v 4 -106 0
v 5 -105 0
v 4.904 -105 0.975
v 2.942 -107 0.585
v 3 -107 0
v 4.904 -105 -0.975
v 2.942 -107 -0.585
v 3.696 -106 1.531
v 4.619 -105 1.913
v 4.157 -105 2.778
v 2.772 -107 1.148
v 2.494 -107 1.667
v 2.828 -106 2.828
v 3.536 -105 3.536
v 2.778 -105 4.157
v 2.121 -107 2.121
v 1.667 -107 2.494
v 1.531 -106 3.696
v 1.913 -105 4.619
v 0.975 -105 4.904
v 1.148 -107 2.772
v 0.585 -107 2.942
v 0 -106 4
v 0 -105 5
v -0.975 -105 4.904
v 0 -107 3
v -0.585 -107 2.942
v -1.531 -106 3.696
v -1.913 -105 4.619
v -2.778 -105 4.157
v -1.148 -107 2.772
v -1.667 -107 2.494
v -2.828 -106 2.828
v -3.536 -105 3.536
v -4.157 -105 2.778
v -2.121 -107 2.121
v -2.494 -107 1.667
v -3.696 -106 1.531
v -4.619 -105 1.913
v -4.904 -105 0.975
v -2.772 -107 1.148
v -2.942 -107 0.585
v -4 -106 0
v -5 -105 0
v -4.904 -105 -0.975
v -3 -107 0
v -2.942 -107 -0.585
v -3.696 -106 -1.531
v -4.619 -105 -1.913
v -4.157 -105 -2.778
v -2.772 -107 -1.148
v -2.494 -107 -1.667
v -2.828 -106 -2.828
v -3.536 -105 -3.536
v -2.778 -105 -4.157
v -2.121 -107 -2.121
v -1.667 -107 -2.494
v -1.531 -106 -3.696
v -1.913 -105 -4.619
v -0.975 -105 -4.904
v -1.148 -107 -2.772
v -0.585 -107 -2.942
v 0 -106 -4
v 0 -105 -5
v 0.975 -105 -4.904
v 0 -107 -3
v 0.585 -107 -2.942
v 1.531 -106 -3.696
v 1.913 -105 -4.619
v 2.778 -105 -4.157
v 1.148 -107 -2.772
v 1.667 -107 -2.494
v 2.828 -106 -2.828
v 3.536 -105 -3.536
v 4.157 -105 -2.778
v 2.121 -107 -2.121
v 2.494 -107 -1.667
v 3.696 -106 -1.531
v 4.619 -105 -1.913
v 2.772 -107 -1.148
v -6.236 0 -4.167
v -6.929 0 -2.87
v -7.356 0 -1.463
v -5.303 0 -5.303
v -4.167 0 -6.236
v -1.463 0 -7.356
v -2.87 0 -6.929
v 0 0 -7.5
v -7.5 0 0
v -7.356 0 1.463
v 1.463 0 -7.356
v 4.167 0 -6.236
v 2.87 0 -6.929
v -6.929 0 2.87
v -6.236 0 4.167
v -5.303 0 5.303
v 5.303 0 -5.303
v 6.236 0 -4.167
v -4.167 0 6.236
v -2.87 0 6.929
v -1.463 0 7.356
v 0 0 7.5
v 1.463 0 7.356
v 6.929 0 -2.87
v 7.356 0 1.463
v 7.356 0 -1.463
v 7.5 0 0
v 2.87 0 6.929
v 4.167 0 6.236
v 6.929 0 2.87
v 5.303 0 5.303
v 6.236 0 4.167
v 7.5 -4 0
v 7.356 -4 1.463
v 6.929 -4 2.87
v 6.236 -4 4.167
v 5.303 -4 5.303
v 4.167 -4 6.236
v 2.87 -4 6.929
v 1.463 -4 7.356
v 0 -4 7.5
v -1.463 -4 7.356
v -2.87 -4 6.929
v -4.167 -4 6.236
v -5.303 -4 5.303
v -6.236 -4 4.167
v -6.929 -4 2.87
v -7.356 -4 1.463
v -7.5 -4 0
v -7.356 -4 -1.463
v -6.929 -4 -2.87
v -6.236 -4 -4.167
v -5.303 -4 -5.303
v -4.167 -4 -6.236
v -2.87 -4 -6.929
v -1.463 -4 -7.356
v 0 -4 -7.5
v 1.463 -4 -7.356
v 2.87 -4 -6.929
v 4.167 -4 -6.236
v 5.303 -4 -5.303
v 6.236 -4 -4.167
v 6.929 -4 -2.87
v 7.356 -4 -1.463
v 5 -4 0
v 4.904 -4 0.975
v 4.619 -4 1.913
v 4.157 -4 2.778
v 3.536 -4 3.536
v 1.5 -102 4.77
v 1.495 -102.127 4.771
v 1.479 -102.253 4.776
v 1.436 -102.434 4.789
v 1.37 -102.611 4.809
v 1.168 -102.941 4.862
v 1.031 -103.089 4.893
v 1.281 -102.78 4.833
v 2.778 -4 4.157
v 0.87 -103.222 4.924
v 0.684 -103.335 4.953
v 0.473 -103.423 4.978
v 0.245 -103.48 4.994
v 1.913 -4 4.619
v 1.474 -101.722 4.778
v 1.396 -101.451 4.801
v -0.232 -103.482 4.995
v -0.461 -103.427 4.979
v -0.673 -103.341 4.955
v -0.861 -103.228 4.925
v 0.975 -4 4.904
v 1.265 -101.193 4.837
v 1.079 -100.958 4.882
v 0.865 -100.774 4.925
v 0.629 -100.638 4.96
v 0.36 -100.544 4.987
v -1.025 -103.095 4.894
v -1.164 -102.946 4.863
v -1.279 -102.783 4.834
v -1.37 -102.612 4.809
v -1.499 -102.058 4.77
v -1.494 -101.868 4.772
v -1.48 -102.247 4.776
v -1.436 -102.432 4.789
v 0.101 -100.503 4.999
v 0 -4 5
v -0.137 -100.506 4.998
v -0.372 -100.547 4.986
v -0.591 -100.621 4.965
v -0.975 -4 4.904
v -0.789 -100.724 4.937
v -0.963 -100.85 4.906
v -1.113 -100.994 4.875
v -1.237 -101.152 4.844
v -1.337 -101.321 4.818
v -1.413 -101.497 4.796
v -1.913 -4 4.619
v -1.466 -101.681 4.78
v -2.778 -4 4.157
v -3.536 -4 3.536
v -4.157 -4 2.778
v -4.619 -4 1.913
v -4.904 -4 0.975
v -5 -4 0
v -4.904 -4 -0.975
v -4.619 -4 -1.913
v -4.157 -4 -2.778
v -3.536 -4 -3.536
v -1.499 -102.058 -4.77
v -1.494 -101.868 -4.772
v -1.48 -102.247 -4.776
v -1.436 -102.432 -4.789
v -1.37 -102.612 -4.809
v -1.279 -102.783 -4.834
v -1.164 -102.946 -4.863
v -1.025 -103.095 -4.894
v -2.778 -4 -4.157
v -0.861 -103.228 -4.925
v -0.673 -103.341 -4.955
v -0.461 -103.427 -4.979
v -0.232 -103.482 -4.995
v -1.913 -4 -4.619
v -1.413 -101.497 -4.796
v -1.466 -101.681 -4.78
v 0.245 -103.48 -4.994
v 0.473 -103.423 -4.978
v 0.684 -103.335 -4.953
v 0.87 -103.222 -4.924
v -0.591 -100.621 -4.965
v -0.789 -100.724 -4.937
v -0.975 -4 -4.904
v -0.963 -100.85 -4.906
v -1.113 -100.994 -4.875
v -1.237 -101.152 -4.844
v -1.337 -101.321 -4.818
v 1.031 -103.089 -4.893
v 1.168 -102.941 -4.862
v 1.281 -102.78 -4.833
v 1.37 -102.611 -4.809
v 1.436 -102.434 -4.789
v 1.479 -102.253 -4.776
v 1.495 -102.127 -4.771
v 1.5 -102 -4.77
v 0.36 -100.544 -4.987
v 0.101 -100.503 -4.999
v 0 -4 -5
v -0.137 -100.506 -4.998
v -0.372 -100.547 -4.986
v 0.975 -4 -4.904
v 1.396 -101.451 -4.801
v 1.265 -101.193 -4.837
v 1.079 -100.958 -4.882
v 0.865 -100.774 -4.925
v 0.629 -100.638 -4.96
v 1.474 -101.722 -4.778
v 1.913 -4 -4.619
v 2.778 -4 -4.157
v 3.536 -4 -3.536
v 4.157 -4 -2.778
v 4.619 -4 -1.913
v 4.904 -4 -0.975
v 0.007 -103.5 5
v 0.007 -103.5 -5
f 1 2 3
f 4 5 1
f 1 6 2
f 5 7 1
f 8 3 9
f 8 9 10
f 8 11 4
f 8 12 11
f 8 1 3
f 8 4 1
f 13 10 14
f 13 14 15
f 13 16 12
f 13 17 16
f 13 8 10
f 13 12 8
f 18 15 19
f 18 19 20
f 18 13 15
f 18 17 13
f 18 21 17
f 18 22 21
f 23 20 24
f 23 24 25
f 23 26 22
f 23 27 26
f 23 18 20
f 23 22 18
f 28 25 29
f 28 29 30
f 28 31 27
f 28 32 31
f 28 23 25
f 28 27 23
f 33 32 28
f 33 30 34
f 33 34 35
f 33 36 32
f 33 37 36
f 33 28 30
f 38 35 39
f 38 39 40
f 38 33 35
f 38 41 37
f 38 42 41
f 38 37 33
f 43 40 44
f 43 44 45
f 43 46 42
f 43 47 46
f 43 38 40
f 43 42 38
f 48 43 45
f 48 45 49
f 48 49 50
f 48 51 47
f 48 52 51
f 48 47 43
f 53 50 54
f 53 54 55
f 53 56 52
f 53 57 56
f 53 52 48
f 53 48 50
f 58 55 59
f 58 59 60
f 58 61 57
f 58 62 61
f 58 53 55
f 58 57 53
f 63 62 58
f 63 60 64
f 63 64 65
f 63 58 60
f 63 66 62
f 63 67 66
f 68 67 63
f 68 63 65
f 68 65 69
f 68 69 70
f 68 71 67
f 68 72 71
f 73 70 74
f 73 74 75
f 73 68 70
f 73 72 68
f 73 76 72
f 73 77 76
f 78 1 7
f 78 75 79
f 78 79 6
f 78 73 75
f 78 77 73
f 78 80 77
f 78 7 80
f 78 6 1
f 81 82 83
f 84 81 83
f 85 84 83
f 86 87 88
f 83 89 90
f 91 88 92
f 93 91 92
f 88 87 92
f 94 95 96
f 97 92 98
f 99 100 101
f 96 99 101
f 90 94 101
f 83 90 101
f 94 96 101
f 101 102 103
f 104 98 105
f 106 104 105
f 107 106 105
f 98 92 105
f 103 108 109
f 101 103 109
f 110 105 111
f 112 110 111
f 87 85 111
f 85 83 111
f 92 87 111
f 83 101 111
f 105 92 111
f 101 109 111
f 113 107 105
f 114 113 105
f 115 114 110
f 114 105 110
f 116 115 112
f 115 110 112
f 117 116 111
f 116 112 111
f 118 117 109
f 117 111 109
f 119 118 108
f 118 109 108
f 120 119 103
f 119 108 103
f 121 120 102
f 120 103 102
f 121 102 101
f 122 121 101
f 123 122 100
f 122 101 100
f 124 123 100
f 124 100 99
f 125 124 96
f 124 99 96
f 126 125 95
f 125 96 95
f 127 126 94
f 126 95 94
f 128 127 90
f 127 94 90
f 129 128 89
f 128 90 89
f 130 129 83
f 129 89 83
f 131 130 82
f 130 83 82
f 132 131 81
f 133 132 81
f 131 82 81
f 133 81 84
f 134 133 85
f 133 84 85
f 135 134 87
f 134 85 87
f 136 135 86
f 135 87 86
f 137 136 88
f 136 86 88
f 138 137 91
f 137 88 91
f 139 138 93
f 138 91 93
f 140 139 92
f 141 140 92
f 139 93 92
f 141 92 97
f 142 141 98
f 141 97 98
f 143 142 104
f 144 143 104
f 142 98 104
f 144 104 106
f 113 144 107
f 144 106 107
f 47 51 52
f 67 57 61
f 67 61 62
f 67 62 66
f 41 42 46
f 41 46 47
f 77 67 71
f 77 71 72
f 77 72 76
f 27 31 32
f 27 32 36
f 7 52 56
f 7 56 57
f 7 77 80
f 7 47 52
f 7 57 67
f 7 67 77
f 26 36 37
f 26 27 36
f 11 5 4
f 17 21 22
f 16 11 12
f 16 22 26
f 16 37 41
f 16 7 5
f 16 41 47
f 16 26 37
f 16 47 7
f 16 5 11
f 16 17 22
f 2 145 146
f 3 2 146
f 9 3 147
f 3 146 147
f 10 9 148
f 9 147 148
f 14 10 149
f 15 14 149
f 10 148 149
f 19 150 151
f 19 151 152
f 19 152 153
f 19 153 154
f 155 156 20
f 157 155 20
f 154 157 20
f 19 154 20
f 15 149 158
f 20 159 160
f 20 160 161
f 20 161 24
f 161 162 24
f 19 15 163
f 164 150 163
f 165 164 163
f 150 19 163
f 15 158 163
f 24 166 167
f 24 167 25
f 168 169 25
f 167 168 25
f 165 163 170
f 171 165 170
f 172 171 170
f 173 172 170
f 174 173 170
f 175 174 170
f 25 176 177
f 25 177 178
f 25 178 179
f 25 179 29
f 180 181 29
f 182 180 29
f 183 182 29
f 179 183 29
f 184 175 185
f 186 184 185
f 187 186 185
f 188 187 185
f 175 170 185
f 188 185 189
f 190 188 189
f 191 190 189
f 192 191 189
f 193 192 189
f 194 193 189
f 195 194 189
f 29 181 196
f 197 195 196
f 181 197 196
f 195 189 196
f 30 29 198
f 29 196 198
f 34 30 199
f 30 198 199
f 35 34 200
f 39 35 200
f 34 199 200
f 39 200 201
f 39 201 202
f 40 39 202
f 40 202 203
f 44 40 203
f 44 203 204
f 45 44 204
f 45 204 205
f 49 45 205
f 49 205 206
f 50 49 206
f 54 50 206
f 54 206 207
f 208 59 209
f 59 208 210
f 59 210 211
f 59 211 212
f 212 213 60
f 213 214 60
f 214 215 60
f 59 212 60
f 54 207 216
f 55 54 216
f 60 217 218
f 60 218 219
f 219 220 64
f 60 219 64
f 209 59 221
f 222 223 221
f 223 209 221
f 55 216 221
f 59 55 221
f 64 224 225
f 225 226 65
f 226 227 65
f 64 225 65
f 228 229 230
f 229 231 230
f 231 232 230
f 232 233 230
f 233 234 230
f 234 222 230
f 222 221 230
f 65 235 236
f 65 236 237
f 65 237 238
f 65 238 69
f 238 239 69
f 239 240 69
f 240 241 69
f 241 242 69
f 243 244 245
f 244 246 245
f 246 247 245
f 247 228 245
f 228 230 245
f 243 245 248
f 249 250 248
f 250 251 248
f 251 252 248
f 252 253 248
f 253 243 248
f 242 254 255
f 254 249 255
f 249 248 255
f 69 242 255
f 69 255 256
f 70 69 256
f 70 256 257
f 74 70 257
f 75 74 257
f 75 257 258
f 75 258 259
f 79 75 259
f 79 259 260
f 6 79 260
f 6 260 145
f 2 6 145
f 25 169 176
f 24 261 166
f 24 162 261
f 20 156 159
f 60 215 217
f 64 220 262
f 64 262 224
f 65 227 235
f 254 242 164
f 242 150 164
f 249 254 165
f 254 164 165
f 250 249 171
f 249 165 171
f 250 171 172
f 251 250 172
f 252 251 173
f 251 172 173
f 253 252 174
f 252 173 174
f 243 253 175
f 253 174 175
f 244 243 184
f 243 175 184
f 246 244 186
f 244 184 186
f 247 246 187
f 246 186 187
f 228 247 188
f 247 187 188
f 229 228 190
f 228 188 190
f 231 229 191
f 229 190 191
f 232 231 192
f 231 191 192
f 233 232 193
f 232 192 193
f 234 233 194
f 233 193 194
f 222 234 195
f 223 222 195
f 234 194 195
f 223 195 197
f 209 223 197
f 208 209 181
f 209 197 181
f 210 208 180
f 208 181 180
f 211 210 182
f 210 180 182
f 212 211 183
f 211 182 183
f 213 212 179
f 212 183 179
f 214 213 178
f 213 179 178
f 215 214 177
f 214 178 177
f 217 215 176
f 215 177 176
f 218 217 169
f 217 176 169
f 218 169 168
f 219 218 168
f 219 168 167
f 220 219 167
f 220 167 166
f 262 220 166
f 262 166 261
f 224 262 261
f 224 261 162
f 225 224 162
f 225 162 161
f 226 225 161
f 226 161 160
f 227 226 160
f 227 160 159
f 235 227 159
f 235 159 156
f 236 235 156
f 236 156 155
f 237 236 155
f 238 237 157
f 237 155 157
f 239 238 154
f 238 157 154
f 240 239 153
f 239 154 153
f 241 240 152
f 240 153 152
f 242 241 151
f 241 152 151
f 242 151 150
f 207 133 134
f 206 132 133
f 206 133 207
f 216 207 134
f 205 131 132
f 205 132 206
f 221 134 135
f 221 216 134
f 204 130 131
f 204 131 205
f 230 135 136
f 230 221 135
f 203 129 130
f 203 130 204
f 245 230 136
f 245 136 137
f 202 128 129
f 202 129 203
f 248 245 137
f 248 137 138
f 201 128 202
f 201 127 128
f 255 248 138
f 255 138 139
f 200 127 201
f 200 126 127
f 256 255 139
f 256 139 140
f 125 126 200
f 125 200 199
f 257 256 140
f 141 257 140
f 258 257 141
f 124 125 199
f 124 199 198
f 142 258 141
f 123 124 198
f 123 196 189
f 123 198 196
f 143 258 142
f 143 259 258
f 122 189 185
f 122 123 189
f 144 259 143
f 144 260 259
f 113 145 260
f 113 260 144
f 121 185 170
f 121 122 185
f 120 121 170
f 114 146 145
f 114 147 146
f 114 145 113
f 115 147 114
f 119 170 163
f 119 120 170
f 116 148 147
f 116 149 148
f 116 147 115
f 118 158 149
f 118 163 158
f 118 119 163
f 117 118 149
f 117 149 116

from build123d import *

# Parameters (mm, degrees)
F0_R     = 7.5
F1_DEPTH = 4
F2_R     = 5
F3_DEPTH = 103
F4_R     = 1.5
F5_DEPTH = 12.5
F6_SIZE  = 2


with BuildPart() as f1:
    # F0 (on Front) → F1 (new body)
    with BuildSketch(Plane.XZ):
        Circle(F0_R)
    extrude(amount=F1_DEPTH)

    # F2 (on face) → F3 (join)
    with BuildSketch(Plane.XZ.offset(4)):
        Circle(F2_R)
    extrude(amount=F3_DEPTH)

    # F4 (on Top) → F5 (cut, symmetric)
    with BuildSketch(Plane.XY):
        with Locations((0, -102)):
            Circle(F4_R)
    extrude(amount=F5_DEPTH, both=True, mode=Mode.SUBTRACT)

    # F6
    f6_edges = [f1.edges().sort_by_distance(p)[0] for p in [
        (-5, -107, 0),
    ]]
    chamfer(f6_edges, length=F6_SIZE)


solid = f1.part
